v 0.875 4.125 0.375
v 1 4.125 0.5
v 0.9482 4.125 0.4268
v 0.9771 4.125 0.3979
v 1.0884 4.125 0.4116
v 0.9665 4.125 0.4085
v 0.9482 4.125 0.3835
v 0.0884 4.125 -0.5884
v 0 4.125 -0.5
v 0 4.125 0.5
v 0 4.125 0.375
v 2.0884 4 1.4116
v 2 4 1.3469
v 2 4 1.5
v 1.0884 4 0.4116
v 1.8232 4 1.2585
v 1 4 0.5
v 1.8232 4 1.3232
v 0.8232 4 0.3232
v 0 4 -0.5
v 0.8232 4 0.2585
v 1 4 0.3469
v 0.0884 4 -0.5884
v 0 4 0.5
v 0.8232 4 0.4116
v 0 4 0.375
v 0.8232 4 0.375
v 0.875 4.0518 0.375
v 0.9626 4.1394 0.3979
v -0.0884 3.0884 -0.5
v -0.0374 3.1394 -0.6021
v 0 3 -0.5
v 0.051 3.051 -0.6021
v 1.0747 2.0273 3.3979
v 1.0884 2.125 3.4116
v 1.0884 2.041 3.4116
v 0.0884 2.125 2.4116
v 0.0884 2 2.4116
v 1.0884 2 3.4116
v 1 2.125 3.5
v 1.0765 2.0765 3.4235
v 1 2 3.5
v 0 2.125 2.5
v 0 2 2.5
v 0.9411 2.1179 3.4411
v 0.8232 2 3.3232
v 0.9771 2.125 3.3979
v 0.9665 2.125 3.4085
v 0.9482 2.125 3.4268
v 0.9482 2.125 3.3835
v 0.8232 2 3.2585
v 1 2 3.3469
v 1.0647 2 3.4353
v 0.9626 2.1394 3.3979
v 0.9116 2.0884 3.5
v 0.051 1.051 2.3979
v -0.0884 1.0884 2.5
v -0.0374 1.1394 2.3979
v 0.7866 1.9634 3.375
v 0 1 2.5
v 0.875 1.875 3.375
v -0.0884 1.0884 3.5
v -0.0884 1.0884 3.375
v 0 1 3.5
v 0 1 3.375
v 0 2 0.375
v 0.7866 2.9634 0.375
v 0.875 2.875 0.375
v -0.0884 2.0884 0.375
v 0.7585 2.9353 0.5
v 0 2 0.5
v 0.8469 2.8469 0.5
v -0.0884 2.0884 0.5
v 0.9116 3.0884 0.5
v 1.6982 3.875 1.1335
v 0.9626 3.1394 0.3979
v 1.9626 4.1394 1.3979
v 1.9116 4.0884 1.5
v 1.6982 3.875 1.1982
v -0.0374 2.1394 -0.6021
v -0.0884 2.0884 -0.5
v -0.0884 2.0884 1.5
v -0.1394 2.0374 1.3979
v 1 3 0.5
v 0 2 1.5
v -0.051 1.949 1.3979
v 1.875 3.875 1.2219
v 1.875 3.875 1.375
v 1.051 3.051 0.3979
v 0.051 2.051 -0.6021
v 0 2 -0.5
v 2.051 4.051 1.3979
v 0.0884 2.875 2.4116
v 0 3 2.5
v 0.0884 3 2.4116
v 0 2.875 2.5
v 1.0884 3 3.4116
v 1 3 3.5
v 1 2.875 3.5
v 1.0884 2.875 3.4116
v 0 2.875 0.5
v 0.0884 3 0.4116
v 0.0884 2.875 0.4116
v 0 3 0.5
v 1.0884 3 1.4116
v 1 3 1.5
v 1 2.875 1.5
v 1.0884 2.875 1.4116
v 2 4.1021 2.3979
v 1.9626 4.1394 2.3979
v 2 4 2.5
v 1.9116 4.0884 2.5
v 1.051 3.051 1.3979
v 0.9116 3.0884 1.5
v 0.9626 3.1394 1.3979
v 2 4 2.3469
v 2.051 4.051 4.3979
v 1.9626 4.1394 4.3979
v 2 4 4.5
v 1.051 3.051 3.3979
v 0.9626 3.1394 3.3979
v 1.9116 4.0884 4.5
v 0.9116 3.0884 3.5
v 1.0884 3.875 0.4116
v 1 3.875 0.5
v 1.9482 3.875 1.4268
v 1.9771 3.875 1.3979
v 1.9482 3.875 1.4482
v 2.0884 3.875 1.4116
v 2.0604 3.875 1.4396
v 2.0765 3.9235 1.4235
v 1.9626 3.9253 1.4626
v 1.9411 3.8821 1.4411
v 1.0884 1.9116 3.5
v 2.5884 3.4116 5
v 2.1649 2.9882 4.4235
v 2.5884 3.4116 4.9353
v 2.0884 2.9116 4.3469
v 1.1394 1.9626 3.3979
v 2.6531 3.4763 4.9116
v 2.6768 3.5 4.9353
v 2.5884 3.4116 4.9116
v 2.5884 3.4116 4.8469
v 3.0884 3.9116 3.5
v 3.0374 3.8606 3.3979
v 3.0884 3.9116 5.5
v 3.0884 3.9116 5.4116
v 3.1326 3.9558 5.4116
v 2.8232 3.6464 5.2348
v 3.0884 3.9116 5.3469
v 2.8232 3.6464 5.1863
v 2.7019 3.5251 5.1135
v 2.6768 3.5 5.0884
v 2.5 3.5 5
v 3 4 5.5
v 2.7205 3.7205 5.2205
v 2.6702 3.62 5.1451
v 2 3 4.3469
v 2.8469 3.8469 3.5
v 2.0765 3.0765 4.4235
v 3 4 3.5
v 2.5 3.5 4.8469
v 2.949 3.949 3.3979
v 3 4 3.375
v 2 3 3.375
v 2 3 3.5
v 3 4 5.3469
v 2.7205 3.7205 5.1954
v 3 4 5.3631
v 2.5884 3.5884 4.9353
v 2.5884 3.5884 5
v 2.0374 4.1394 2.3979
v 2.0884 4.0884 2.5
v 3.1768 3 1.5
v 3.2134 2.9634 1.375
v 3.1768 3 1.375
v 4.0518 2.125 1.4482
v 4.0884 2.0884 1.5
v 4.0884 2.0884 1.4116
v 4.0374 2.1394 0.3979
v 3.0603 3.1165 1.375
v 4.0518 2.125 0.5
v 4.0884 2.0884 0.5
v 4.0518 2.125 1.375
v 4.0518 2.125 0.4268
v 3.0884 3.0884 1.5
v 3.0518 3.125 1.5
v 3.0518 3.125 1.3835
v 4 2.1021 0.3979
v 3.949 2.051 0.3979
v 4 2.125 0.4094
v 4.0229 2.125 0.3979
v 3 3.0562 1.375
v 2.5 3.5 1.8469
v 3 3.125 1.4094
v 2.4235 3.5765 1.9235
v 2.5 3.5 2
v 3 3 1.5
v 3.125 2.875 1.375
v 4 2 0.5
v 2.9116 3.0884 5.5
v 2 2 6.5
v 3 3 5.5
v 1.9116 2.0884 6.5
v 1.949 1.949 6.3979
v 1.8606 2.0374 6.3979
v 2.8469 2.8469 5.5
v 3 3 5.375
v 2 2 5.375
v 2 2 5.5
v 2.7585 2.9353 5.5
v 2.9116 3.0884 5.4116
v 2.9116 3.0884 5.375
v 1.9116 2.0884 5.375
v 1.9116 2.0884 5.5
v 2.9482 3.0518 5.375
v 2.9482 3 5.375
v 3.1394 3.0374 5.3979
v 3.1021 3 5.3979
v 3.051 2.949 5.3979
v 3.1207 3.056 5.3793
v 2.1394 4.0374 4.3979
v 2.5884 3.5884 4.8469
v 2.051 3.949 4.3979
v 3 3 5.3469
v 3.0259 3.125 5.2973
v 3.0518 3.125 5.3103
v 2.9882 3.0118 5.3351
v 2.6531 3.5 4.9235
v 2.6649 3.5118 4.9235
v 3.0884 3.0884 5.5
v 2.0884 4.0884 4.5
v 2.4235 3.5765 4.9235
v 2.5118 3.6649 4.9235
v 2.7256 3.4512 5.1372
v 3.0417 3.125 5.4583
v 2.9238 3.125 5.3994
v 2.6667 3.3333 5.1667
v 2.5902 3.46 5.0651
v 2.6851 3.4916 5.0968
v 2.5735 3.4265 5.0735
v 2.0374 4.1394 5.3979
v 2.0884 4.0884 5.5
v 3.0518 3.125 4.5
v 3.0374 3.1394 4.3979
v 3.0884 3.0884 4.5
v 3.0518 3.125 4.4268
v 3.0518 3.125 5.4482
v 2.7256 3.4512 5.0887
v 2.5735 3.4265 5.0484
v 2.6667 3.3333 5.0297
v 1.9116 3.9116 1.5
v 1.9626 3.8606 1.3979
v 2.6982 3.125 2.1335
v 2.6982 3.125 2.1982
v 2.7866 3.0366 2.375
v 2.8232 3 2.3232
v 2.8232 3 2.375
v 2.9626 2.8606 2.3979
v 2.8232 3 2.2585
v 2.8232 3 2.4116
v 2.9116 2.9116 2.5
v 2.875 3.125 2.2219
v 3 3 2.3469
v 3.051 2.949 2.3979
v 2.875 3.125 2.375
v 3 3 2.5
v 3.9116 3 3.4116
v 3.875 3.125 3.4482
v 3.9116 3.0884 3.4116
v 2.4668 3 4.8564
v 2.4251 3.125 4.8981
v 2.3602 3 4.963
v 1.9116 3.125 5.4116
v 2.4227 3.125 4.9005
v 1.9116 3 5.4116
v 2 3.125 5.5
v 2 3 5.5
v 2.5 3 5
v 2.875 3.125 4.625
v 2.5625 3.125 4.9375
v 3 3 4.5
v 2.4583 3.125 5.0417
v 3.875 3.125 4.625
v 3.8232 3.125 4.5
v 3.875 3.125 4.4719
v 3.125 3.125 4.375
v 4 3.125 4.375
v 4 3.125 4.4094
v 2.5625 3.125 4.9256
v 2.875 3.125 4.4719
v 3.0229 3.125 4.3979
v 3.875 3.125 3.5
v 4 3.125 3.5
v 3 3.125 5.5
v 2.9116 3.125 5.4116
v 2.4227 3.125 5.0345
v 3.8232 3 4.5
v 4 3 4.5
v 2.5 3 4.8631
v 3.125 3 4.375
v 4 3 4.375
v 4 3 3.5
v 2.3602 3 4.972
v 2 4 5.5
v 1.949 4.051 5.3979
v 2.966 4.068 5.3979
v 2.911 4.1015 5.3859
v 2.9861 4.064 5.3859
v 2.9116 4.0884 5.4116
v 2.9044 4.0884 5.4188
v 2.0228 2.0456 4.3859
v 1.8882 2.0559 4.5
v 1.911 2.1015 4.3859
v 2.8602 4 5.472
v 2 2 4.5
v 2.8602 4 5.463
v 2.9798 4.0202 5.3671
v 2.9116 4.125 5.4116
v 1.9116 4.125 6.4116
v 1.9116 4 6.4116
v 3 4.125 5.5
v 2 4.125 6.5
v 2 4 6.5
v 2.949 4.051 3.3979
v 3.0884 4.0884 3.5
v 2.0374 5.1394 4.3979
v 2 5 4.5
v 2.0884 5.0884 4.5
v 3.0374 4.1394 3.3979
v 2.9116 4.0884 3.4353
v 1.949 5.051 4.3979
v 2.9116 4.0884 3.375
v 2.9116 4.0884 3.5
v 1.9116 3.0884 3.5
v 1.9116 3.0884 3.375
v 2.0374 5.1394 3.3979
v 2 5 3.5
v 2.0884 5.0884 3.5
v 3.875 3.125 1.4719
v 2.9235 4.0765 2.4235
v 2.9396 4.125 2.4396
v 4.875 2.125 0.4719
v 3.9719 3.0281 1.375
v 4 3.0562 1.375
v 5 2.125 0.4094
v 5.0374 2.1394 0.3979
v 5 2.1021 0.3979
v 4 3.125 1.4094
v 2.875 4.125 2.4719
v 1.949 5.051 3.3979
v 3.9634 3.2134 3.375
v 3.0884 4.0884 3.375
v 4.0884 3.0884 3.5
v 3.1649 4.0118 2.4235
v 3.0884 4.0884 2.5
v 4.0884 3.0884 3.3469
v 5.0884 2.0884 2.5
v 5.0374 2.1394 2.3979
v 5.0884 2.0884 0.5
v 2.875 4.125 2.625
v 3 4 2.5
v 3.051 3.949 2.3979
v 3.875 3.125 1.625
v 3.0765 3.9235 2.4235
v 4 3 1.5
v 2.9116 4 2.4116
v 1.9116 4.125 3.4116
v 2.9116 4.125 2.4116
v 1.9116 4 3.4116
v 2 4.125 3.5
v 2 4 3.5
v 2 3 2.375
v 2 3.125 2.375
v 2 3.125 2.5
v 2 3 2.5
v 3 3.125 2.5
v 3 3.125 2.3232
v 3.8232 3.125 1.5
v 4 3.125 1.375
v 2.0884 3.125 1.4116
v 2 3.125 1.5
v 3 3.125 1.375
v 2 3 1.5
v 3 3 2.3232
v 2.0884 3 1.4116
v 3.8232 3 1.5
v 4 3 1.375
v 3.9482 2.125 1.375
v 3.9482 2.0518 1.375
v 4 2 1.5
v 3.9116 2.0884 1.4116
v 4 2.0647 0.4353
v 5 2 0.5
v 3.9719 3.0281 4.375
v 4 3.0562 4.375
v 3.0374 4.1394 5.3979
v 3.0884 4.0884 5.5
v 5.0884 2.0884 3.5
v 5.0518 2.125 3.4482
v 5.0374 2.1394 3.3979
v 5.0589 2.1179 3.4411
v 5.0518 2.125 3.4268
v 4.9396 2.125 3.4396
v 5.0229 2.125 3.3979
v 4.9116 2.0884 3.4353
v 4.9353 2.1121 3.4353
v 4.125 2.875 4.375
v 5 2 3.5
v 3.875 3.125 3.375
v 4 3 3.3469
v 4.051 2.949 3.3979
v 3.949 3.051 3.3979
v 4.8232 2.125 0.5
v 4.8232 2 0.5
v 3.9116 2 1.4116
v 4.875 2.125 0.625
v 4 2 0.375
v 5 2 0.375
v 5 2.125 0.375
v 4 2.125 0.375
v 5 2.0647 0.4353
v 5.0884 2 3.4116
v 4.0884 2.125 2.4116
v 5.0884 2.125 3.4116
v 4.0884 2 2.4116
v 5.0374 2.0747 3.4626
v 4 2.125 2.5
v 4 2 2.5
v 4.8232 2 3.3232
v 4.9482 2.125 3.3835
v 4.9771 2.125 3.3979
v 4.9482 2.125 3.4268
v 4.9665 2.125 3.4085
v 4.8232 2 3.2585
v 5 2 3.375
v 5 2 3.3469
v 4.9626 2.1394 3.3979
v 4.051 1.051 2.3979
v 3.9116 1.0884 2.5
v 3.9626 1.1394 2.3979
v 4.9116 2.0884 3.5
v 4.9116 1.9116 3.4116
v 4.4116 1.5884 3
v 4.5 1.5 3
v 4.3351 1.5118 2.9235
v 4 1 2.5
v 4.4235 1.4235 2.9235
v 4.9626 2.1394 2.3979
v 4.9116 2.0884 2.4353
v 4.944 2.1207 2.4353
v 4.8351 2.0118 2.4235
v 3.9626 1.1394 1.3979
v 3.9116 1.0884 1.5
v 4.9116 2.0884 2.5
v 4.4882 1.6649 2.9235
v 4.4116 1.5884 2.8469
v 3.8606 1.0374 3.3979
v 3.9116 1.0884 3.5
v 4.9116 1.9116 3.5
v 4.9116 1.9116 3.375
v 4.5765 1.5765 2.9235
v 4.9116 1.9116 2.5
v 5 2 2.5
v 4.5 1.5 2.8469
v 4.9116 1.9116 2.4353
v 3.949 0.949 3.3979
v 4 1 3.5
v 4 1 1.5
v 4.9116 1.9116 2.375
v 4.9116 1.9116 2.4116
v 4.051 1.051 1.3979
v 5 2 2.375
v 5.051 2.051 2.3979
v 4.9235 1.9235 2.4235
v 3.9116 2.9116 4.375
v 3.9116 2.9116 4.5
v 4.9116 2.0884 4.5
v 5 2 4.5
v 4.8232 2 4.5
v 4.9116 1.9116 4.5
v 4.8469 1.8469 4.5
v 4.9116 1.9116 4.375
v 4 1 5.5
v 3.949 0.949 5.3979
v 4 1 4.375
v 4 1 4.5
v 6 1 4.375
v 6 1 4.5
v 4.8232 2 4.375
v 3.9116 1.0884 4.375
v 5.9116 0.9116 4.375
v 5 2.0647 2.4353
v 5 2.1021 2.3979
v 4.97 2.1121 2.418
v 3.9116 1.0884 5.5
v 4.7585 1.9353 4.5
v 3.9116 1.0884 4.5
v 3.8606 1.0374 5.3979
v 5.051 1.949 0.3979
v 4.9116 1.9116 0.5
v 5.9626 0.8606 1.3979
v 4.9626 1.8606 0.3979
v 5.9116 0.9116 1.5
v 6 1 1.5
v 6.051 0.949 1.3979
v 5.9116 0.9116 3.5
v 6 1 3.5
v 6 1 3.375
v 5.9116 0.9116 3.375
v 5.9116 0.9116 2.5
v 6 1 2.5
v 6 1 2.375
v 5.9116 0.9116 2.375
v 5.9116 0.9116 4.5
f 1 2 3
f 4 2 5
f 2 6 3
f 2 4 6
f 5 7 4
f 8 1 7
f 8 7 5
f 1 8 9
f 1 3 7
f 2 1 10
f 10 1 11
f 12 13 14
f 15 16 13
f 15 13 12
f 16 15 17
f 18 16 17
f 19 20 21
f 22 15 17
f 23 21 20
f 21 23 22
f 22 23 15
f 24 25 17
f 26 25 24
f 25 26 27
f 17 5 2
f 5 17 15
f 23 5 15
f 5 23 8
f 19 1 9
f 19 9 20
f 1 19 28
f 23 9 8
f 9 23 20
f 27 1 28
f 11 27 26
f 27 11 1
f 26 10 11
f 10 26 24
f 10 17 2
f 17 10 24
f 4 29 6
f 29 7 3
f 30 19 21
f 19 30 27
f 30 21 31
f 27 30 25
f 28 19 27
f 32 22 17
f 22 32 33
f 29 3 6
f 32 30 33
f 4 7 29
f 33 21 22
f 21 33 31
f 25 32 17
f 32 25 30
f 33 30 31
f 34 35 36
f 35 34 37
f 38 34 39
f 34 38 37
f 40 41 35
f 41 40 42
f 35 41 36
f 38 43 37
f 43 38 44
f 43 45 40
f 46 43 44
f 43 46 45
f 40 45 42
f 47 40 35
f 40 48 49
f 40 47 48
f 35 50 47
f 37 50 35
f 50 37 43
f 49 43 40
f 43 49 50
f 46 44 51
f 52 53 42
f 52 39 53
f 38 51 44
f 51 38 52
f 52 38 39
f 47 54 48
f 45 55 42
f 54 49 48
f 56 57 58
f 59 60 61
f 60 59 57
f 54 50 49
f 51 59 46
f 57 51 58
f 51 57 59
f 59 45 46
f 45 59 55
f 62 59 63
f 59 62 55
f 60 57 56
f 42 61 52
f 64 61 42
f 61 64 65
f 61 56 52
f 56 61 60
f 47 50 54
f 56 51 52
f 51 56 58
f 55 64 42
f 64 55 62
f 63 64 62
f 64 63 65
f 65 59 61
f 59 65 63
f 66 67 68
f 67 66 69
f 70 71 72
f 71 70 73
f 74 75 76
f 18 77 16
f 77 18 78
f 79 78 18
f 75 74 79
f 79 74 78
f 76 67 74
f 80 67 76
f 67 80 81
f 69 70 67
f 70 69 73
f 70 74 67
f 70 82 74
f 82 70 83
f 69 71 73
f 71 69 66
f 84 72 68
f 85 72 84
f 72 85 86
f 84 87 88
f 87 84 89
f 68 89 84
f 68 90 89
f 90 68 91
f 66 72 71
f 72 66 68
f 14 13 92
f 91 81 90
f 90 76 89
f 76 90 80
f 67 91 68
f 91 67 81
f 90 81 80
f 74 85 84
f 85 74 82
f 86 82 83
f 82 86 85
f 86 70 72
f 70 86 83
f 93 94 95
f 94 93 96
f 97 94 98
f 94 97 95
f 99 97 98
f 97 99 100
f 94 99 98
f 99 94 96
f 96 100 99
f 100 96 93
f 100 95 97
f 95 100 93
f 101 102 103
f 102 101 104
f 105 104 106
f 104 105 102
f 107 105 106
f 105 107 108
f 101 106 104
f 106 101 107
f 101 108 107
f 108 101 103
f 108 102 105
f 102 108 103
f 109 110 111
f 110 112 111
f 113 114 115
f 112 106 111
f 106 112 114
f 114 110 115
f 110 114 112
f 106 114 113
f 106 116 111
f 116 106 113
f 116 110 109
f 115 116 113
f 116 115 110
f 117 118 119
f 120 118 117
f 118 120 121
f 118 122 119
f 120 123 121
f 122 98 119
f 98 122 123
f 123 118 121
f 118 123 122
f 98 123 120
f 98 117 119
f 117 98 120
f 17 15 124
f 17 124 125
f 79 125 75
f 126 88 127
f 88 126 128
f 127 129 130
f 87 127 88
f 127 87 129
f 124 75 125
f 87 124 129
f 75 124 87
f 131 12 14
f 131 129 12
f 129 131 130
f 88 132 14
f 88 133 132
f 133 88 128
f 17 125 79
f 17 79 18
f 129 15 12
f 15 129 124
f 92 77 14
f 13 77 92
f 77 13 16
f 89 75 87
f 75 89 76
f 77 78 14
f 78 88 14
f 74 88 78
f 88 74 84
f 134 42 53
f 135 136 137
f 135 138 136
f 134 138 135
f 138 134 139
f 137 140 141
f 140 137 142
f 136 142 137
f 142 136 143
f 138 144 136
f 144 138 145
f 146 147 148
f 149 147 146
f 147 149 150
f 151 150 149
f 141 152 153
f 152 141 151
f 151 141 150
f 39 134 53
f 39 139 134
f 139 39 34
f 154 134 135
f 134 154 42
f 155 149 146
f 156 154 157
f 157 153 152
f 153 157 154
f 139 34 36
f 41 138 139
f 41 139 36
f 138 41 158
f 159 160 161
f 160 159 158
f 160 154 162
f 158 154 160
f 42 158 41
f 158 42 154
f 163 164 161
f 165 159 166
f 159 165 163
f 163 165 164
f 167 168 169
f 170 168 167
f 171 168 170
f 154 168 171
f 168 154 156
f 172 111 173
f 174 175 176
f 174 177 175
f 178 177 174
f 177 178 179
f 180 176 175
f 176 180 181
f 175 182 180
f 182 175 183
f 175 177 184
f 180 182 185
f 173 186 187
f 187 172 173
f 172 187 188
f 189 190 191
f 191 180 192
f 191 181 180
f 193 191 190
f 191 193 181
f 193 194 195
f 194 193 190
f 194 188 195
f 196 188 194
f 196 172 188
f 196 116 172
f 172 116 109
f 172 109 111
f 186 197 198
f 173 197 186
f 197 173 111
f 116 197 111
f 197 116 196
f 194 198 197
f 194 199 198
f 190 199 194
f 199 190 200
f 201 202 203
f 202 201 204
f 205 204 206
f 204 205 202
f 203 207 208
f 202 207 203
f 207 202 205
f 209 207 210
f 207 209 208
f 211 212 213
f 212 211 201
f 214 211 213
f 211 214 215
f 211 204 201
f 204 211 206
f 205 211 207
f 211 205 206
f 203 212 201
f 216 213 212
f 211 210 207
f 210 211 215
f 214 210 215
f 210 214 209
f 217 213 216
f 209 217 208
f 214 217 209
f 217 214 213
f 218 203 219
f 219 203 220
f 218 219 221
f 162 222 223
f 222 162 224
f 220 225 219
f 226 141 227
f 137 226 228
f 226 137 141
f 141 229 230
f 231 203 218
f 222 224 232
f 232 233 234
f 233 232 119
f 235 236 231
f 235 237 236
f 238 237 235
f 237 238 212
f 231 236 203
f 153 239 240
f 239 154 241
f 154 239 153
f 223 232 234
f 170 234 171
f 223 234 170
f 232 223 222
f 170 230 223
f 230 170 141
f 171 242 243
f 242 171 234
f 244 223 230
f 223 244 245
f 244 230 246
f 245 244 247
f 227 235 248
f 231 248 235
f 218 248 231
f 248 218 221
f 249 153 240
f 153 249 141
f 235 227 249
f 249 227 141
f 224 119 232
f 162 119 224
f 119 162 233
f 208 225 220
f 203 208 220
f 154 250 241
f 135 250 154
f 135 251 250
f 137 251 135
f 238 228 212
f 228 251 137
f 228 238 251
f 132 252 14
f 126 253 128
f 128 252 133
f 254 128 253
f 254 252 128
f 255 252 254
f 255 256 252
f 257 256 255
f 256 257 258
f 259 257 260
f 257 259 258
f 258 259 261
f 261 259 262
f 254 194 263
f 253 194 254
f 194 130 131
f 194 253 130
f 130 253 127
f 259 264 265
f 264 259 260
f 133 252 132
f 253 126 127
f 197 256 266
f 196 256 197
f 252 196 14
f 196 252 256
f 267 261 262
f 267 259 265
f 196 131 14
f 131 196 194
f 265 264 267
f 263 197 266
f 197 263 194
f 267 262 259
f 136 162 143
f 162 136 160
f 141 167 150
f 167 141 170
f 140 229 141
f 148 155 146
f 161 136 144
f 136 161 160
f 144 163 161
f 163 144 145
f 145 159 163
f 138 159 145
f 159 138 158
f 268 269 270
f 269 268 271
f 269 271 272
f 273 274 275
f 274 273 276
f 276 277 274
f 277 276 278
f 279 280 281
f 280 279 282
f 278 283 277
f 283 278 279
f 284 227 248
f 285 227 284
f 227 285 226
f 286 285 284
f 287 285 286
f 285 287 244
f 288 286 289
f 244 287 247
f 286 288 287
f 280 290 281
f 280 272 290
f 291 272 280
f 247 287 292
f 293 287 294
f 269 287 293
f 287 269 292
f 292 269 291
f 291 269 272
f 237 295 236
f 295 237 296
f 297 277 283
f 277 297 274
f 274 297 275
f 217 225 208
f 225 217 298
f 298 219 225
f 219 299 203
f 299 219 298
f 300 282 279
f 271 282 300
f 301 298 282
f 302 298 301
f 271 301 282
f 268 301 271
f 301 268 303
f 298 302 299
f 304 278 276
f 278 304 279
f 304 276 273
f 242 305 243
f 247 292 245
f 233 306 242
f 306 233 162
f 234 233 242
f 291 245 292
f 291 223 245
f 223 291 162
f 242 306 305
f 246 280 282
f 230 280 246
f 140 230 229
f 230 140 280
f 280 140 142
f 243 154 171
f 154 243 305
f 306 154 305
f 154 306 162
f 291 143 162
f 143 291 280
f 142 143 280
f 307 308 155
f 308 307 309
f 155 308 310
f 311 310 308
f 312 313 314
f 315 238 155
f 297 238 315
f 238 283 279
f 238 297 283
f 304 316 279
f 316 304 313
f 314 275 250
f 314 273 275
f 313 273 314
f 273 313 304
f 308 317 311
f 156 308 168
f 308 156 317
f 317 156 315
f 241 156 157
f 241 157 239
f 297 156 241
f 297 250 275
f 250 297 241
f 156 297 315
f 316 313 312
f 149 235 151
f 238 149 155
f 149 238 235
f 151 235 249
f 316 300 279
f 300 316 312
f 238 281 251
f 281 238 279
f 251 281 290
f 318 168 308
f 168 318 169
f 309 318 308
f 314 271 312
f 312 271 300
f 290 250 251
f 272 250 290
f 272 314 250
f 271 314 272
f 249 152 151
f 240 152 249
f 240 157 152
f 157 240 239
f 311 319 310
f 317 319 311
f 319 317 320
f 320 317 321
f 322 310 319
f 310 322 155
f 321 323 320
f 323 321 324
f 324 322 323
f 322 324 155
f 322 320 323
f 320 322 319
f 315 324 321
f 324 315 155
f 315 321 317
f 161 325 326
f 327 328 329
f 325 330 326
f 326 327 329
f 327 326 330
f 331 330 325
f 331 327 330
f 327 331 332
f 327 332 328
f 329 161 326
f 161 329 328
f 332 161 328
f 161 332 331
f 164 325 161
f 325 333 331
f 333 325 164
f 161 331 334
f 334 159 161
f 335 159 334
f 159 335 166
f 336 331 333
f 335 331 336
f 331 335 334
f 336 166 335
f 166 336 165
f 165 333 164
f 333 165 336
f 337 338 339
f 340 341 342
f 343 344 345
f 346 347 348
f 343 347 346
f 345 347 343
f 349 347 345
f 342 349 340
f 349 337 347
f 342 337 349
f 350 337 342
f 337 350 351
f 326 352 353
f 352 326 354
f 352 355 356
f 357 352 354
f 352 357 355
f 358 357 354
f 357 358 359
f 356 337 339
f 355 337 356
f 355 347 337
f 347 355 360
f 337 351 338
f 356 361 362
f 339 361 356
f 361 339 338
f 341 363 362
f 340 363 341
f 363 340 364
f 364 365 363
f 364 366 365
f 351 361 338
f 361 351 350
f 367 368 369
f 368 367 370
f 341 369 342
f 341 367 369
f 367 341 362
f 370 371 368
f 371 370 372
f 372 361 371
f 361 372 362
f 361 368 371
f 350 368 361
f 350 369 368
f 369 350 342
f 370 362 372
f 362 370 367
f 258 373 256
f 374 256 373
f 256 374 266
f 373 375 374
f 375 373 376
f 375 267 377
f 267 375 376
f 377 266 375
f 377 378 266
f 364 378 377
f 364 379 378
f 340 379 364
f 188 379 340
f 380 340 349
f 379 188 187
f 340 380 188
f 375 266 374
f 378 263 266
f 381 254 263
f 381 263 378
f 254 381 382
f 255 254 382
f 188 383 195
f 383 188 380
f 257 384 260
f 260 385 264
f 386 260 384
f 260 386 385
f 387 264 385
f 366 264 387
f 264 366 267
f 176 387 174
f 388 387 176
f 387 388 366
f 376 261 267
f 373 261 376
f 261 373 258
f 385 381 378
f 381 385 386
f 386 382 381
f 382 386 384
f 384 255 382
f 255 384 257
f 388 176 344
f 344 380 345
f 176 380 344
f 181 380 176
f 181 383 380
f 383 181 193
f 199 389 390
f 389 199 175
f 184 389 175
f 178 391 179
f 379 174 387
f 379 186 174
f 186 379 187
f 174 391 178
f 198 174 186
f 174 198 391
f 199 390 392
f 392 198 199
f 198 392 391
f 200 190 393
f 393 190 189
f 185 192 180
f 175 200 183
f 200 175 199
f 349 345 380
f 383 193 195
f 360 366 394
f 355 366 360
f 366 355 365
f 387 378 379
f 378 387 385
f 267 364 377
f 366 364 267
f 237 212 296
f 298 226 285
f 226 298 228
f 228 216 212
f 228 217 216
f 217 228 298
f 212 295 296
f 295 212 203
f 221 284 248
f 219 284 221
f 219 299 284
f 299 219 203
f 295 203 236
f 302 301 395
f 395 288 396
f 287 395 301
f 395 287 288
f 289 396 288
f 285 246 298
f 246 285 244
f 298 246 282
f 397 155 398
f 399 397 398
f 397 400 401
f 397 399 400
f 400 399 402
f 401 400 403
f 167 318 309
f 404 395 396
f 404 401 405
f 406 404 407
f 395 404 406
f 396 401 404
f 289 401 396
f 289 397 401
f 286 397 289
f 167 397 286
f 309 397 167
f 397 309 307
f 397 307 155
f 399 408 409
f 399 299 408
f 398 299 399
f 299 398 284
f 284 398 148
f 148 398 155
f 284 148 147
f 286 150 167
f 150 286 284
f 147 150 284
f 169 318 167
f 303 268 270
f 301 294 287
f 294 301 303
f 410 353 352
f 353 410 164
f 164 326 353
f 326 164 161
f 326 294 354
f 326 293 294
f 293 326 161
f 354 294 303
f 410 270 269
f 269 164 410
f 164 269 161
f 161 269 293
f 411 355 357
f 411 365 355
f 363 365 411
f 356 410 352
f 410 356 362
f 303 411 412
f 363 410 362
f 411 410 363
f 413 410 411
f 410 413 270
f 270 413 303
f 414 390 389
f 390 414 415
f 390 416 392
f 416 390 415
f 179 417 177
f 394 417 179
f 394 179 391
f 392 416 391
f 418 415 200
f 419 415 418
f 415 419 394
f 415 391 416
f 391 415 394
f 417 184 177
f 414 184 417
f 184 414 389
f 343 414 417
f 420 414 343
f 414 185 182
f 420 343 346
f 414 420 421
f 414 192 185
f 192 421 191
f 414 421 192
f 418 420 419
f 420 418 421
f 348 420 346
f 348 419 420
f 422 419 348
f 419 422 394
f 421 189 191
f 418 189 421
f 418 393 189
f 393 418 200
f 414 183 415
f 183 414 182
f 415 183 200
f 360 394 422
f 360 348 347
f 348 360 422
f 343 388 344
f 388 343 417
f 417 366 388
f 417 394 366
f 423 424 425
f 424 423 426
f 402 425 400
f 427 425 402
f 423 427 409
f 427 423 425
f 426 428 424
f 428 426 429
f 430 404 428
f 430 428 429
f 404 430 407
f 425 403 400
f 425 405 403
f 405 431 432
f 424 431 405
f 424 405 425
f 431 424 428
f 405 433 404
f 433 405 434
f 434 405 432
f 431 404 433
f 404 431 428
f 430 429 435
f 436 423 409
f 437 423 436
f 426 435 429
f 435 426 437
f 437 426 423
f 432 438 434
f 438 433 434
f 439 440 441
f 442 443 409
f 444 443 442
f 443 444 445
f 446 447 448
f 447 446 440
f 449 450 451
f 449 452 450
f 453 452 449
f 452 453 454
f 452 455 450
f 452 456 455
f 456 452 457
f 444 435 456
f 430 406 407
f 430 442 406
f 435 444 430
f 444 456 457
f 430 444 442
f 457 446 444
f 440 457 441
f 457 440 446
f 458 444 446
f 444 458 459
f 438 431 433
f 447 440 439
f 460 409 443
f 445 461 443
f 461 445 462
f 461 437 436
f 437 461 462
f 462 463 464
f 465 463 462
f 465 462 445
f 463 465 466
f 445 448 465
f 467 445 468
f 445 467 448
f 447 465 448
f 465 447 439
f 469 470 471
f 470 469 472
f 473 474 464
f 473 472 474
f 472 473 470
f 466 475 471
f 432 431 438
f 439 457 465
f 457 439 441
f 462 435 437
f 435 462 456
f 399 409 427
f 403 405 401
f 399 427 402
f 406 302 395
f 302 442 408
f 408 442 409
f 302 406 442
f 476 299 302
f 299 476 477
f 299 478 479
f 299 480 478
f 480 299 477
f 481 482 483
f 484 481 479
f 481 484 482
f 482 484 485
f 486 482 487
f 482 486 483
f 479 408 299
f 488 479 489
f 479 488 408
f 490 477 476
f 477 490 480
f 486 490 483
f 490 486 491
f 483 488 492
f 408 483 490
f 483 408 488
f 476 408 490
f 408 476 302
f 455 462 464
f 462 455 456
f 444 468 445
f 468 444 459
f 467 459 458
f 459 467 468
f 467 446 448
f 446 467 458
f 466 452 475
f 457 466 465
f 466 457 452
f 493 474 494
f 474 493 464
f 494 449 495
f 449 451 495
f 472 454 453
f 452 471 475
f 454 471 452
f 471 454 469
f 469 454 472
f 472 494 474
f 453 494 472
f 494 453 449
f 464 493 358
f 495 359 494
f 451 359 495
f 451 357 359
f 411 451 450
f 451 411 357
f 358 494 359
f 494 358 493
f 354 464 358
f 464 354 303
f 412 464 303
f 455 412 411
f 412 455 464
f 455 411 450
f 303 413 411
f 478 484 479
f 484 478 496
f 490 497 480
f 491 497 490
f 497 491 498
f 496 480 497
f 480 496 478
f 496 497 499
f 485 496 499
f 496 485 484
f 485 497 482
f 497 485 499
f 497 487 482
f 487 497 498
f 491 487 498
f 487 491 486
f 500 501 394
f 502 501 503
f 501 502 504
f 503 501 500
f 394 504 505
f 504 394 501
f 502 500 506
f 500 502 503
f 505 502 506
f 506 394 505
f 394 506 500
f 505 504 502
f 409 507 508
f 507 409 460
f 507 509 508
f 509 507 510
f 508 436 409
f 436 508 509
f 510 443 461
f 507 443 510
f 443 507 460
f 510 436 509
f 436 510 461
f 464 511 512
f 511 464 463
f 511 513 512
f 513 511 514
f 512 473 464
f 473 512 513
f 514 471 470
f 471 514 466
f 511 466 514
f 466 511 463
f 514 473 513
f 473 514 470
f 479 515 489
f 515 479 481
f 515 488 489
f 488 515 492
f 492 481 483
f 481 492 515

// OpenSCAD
translate(v = [-0.5, -0.5, 0]) {
	/*Shell 0*/
	union() {
		%/*Nodes shell 0*/
		union() {
			/*Node $_12*/
			color(alpha = 0.1, c = "orange") {
				translate(v = [0, 4, -1]) {
					cube(size = [1, 1, 1]);
				}
			}
			/*Node $_25*/
			color(alpha = 0.1, c = "yellow") {
				translate(v = [0, 4, 0]) {
					cube(size = [1, 1, 1]);
				}
			}
			/*Node $_6*/
			color(alpha = 0.1, c = "pink") {
				translate(v = [0, 3, -1]) {
					cube(size = [1, 1, 1]);
				}
			}
			/*Node $_14*/
			color(alpha = 0.1, c = "orange") {
				translate(v = [0, 2, 2]) {
					cube(size = [1, 1, 1]);
				}
			}
			/*Node $_27*/
			color(alpha = 0.1, c = "yellow") {
				translate(v = [0, 1, 2]) {
					cube(size = [1, 1, 1]);
				}
			}
			/*Node $_8*/
			color(alpha = 0.1, c = "pink") {
				translate(v = [0, 1, 3]) {
					cube(size = [1, 1, 1]);
				}
			}
			/*Node $_21*/
			color(alpha = 0.1, c = "orange") {
				translate(v = [0, 2, 0]) {
					cube(size = [1, 1, 1]);
				}
			}
			/*Node $_34*/
			color(alpha = 0.1, c = "yellow") {
				translate(v = [0, 2, -1]) {
					cube(size = [1, 1, 1]);
				}
			}
			/*Node $_10*/
			color(alpha = 0.1, c = "pink") {
				translate(v = [0, 2, 1]) {
					cube(size = [1, 1, 1]);
				}
			}
			/*Node $_5__0*/
			color(alpha = 0.1, c = "lightblue") {
				translate(v = [0, 3, 2]) {
					cube(size = [1, 1, 1]);
				}
			}
			/*Node $_3__0*/
			color(alpha = 0.1, c = "lightblue") {
				translate(v = [0, 3, 0]) {
					cube(size = [1, 1, 1]);
				}
			}
		}
		/*Edges shell 0*/
		union() {
			/*Edge 12 from bank.devices[0].thingy.vcollect to $_12*/
			translate(v = [0.5, 4.5, -0.5]) {
				rotate(a = [0, 45.00000000000001, 0.0]) {
					cube(size = [0.125, 0.125, 1.4142135623730951]);
				}
			}
			/*Edge 25 from bank.devices[0].thingy.vcollect to $_25*/
			translate(v = [0.5, 4.5, 0.5]) {
				rotate(a = [0, 90.0, 0.0]) {
					cube(size = [0.125, 0.125, 1.0]);
				}
			}
			/*Edge 6 from bank.devices[0].thingy.vcollect to $_6*/
			translate(v = [0.5, 3.5, -0.5]) {
				rotate(a = [0, 54.735610317245346, 45.0]) {
					cube(size = [0.125, 0.125, 1.7320508075688772]);
				}
			}
			/*Edge 14 from bank.devices[0].thingy.vlysis_out to $_14*/
			translate(v = [0.5, 2.5, 2.5]) {
				rotate(a = [0, 45.00000000000001, 0.0]) {
					cube(size = [0.125, 0.125, 1.4142135623730951]);
				}
			}
			/*Edge 27 from bank.devices[0].thingy.vlysis_out to $_27*/
			translate(v = [0.5, 1.5, 2.5]) {
				rotate(a = [0, 54.735610317245346, 45.0]) {
					cube(size = [0.125, 0.125, 1.7320508075688772]);
				}
			}
			/*Edge 8 from bank.devices[0].thingy.vlysis_out to $_8*/
			translate(v = [0.5, 1.5, 3.5]) {
				rotate(a = [0, 90.0, 45.0]) {
					cube(size = [0.125, 0.125, 1.4142135623730951]);
				}
			}
			/*Edge 21 from bank.devices[0].thingy.vwaste to $_21*/
			translate(v = [0.5, 2.5, 0.5]) {
				rotate(a = [0, 90.0, 45.0]) {
					cube(size = [0.125, 0.125, 1.4142135623730951]);
				}
			}
			/*Edge 34 from bank.devices[0].thingy.vwaste to $_34*/
			translate(v = [0.5, 2.5, -0.5]) {
				rotate(a = [0, 54.735610317245346, 45.0]) {
					cube(size = [0.125, 0.125, 1.7320508075688772]);
				}
			}
			/*Edge 10 from bank.devices[0].thingy.vwaste to $_10*/
			translate(v = [0.5, 2.5, 1.5]) {
				rotate(a = [0, 125.26438968275465, 45.0]) {
					cube(size = [0.125, 0.125, 1.7320508075688772]);
				}
			}
			/*Edge -1 from $_5__0 to $_5__1*/
			translate(v = [1.5, 3.5, 3.5]) {
				rotate(a = [0, 135.0, 180.0]) {
					cube(size = [0.125, 0.125, 1.4142135623730951]);
				}
			}
			/*Edge -1 from $_3__0 to $_3__1*/
			translate(v = [1.5, 3.5, 1.5]) {
				rotate(a = [0, 135.0, 180.0]) {
					cube(size = [0.125, 0.125, 1.4142135623730951]);
				}
			}
		}
	}
	/*Shell 1*/
	union() {
		%/*Nodes shell 1*/
		union() {
			/*Node bank.devices[0].thingy.vcollect*/
			color(alpha = 0.1, c = "black") {
				translate(v = [1, 4, 0]) {
					cube(size = [1, 1, 1]);
				}
			}
			/*Node bank.devices[0].thingy.vlysis_out*/
			color(alpha = 0.1, c = "black") {
				translate(v = [1, 2, 3]) {
					cube(size = [1, 1, 1]);
				}
			}
			/*Node bank.devices[0].thingy.vwaste*/
			color(alpha = 0.1, c = "black") {
				translate(v = [1, 3, 0]) {
					cube(size = [1, 1, 1]);
				}
			}
			/*Node $_5__1*/
			color(alpha = 0.1, c = "lightblue") {
				translate(v = [1, 3, 3]) {
					cube(size = [1, 1, 1]);
				}
			}
			/*Node $_3__1*/
			color(alpha = 0.1, c = "lightblue") {
				translate(v = [1, 3, 1]) {
					cube(size = [1, 1, 1]);
				}
			}
		}
		/*Edges shell 1*/
		union() {
			/*Edge -1 from $_3 to $_3__1*/
			translate(v = [1.5, 3.5, 1.5]) {
				rotate(a = [0, 54.735610317245346, 45.0]) {
					cube(size = [0.125, 0.125, 1.7320508075688772]);
				}
			}
			/*Edge -1 from $_5 to $_5__1*/
			translate(v = [1.5, 3.5, 3.5]) {
				rotate(a = [0, 54.735610317245346, 45.0]) {
					cube(size = [0.125, 0.125, 1.7320508075688772]);
				}
			}
			/*Edge 40 from bank.devices[0].thingy.vcollect to $_40*/
			translate(v = [2.5, 4.5, 1.5]) {
				rotate(a = [0, 135.0, 180.0]) {
					cube(size = [0.125, 0.125, 1.4142135623730951]);
				}
			}
			/*Edge 40 from $_40 to bank.devices[0].thingy.vwaste*/
			translate(v = [1.5, 3.5, 0.5]) {
				rotate(a = [0, 54.735610317245346, 45.0]) {
					cube(size = [0.125, 0.125, 1.7320508075688772]);
				}
			}
			/*Edge 42 from bank.devices[0].thingy.vlysis_out to $_42*/
			translate(v = [2.5, 3.5, 4.5]) {
				rotate(a = [0, 125.26438968275465, -135.0]) {
					cube(size = [0.125, 0.125, 1.7320508075688772]);
				}
			}
		}
	}
	/*Shell 2*/
	union() {
		%/*Nodes shell 2*/
		union() {
			/*Node $_3*/
			color(alpha = 0.1, c = "pink") {
				translate(v = [2, 4, 2]) {
					cube(size = [1, 1, 1]);
				}
			}
			/*Node $_24*/
			color(alpha = 0.1, c = "yellow") {
				translate(v = [2, 2, 6]) {
					cube(size = [1, 1, 1]);
				}
			}
			/*Node $_39*/
			color(alpha = 0.1, c = "yellow") {
				translate(v = [2, 2, 5]) {
					cube(size = [1, 1, 1]);
				}
			}
			/*Node $_5*/
			color(alpha = 0.1, c = "pink") {
				translate(v = [2, 4, 4]) {
					cube(size = [1, 1, 1]);
				}
			}
			/*Node $_40*/
			color(alpha = 0.1, c = "lightgreen") {
				translate(v = [2, 4, 1]) {
					cube(size = [1, 1, 1]);
				}
			}
			/*Node $_42*/
			color(alpha = 0.1, c = "lightgreen") {
				translate(v = [2, 3, 4]) {
					cube(size = [1, 1, 1]);
				}
			}
			/*Node $_16*/
			color(alpha = 0.1, c = "orange") {
				translate(v = [2, 3, 5]) {
					cube(size = [1, 1, 1]);
				}
			}
			/*Node $_29*/
			color(alpha = 0.1, c = "yellow") {
				translate(v = [2, 4, 5]) {
					cube(size = [1, 1, 1]);
				}
			}
			/*Node $_17*/
			color(alpha = 0.1, c = "orange") {
				translate(v = [2, 2, 4]) {
					cube(size = [1, 1, 1]);
				}
			}
			/*Node $_30*/
			color(alpha = 0.1, c = "yellow") {
				translate(v = [2, 4, 6]) {
					cube(size = [1, 1, 1]);
				}
			}
			/*Node $_18*/
			color(alpha = 0.1, c = "orange") {
				translate(v = [2, 5, 4]) {
					cube(size = [1, 1, 1]);
				}
			}
			/*Node $_31*/
			color(alpha = 0.1, c = "yellow") {
				translate(v = [2, 3, 3]) {
					cube(size = [1, 1, 1]);
				}
			}
			/*Node $_19*/
			color(alpha = 0.1, c = "orange") {
				translate(v = [2, 5, 3]) {
					cube(size = [1, 1, 1]);
				}
			}
			/*Node $_32*/
			color(alpha = 0.1, c = "yellow") {
				translate(v = [2, 4, 3]) {
					cube(size = [1, 1, 1]);
				}
			}
			/*Node $_20*/
			color(alpha = 0.1, c = "orange") {
				translate(v = [2, 3, 2]) {
					cube(size = [1, 1, 1]);
				}
			}
			/*Node $_33*/
			color(alpha = 0.1, c = "yellow") {
				translate(v = [2, 3, 1]) {
					cube(size = [1, 1, 1]);
				}
			}
		}
		/*Edges shell 2*/
		union() {
			/*Edge 3 from bank.devices[0].thingy.vbead_out to $_3*/
			translate(v = [2.5, 4.5, 2.5]) {
				rotate(a = [0, 125.26438968275465, -45.0]) {
					cube(size = [0.125, 0.125, 1.7320508075688772]);
				}
			}
			/*Edge 24 from bank.devices[0].thingy.vcell_out to $_24*/
			translate(v = [2.5, 2.5, 6.5]) {
				rotate(a = [0, 125.26438968275465, 45.0]) {
					cube(size = [0.125, 0.125, 1.7320508075688772]);
				}
			}
			/*Edge 39 from bank.devices[0].thingy.vcell_out to $_39*/
			translate(v = [2.5, 2.5, 5.5]) {
				rotate(a = [0, 90.0, 45.0]) {
					cube(size = [0.125, 0.125, 1.4142135623730951]);
				}
			}
			/*Edge 5 from bank.devices[0].thingy.vcell_out to $_5*/
			translate(v = [2.5, 4.5, 4.5]) {
				rotate(a = [0, 54.735610317245346, -45.0]) {
					cube(size = [0.125, 0.125, 1.7320508075688772]);
				}
			}
			/*Edge 40 from $_40 to bank.devices[0].thingy.vsieve*/
			translate(v = [3.5, 3.5, 2.5]) {
				rotate(a = [0, 125.26438968275465, 135.0]) {
					cube(size = [0.125, 0.125, 1.7320508075688772]);
				}
			}
			/*Edge 42 from $_42 to bank.devices[0].thingy.vpump2*/
			translate(v = [3.5, 4.5, 5.5]) {
				rotate(a = [0, 125.26438968275465, -135.0]) {
					cube(size = [0.125, 0.125, 1.7320508075688772]);
				}
			}
			/*Edge 42 from $_42 to bank.devices[0].thingy.vpump3*/
			translate(v = [3.5, 4.5, 3.5]) {
				rotate(a = [0, 54.735610317245346, -135.0]) {
					cube(size = [0.125, 0.125, 1.7320508075688772]);
				}
			}
			/*Edge 16 from bank.devices[0].thingy.vpump1 to $_16*/
			translate(v = [2.5, 3.5, 5.5]) {
				rotate(a = [0, 135.0, 0.0]) {
					cube(size = [0.125, 0.125, 1.4142135623730951]);
				}
			}
			/*Edge 29 from bank.devices[0].thingy.vpump1 to $_29*/
			translate(v = [2.5, 4.5, 5.5]) {
				rotate(a = [0, 125.26438968275465, -45.0]) {
					cube(size = [0.125, 0.125, 1.7320508075688772]);
				}
			}
			/*Edge 17 from bank.devices[0].thingy.vpump2 to $_17*/
			translate(v = [2.5, 2.5, 4.5]) {
				rotate(a = [0, 65.9051574478893, 63.43494882292201]) {
					cube(size = [0.125, 0.125, 2.449489742783178]);
				}
			}
			/*Edge 30 from bank.devices[0].thingy.vpump2 to $_30*/
			translate(v = [2.5, 4.5, 6.5]) {
				rotate(a = [0, 135.0, 0.0]) {
					cube(size = [0.125, 0.125, 1.4142135623730951]);
				}
			}
			/*Edge 18 from bank.devices[0].thingy.vpump3 to $_18*/
			translate(v = [2.5, 5.5, 4.5]) {
				rotate(a = [0, 125.26438968275465, -45.0]) {
					cube(size = [0.125, 0.125, 1.7320508075688772]);
				}
			}
			/*Edge 31 from bank.devices[0].thingy.vpump3 to $_31*/
			translate(v = [2.5, 3.5, 3.5]) {
				rotate(a = [0, 90.0, 45.0]) {
					cube(size = [0.125, 0.125, 1.4142135623730951]);
				}
			}
			/*Edge 19 from bank.devices[0].thingy.vsep to $_19*/
			translate(v = [2.5, 5.5, 3.5]) {
				rotate(a = [0, 125.26438968275465, -45.0]) {
					cube(size = [0.125, 0.125, 1.7320508075688772]);
				}
			}
			/*Edge 32 from bank.devices[0].thingy.vsep to $_32*/
			translate(v = [2.5, 4.5, 3.5]) {
				rotate(a = [0, 135.0, 0.0]) {
					cube(size = [0.125, 0.125, 1.4142135623730951]);
				}
			}
			/*Edge 20 from bank.devices[0].thingy.vsieve to $_20*/
			translate(v = [2.5, 3.5, 2.5]) {
				rotate(a = [0, 90.0, 0.0]) {
					cube(size = [0.125, 0.125, 1.0]);
				}
			}
			/*Edge 33 from bank.devices[0].thingy.vsieve to $_33*/
			translate(v = [2.5, 3.5, 1.5]) {
				rotate(a = [0, 45.00000000000001, 0.0]) {
					cube(size = [0.125, 0.125, 1.4142135623730951]);
				}
			}
		}
	}
	/*Shell 3*/
	union() {
		%/*Nodes shell 3*/
		union() {
			/*Node bank.devices[0].thingy.vbead_out*/
			color(alpha = 0.1, c = "black") {
				translate(v = [3, 3, 1]) {
					cube(size = [1, 1, 1]);
				}
			}
			/*Node bank.devices[0].thingy.vcell_out*/
			color(alpha = 0.1, c = "black") {
				translate(v = [3, 3, 5]) {
					cube(size = [1, 1, 1]);
				}
			}
			/*Node bank.devices[0].thingy.vpump1*/
			color(alpha = 0.1, c = "black") {
				translate(v = [3, 3, 4]) {
					cube(size = [1, 1, 1]);
				}
			}
			/*Node bank.devices[0].thingy.vpump2*/
			color(alpha = 0.1, c = "black") {
				translate(v = [3, 4, 5]) {
					cube(size = [1, 1, 1]);
				}
			}
			/*Node bank.devices[0].thingy.vpump3*/
			color(alpha = 0.1, c = "black") {
				translate(v = [3, 4, 3]) {
					cube(size = [1, 1, 1]);
				}
			}
			/*Node bank.devices[0].thingy.vsep*/
			color(alpha = 0.1, c = "black") {
				translate(v = [3, 4, 2]) {
					cube(size = [1, 1, 1]);
				}
			}
			/*Node bank.devices[0].thingy.vsieve*/
			color(alpha = 0.1, c = "black") {
				translate(v = [3, 3, 2]) {
					cube(size = [1, 1, 1]);
				}
			}
		}
		/*Edges shell 3*/
		union() {
			/*Edge 22 from $_22 to bank.devices[0].thingy.vbead_out*/
			translate(v = [3.5, 3.5, 1.5]) {
				rotate(a = [0, 90.0, -45.0]) {
					cube(size = [0.125, 0.125, 1.4142135623730951]);
				}
			}
			/*Edge 35 from $_35 to bank.devices[0].thingy.vbead_out*/
			translate(v = [3.5, 3.5, 1.5]) {
				rotate(a = [0, 125.26438968275465, -45.0]) {
					cube(size = [0.125, 0.125, 1.7320508075688772]);
				}
			}
			/*Edge 37 from $_37 to bank.devices[0].thingy.vbead_out*/
			translate(v = [3.5, 3.5, 1.5]) {
				rotate(a = [0, 90.0, 0.0]) {
					cube(size = [0.125, 0.125, 1.0]);
				}
			}
			/*Edge 37 from $_37 to bank.devices[0].thingy.vsep*/
			translate(v = [3.5, 4.5, 2.5]) {
				rotate(a = [0, 125.26438968275465, -45.0]) {
					cube(size = [0.125, 0.125, 1.7320508075688772]);
				}
			}
			/*Edge 37 from $_37 to bank.devices[0].thingy.vsieve*/
			translate(v = [3.5, 3.5, 2.5]) {
				rotate(a = [0, 135.0, 0.0]) {
					cube(size = [0.125, 0.125, 1.4142135623730951]);
				}
			}
			/*Edge 38 from $_38 to bank.devices[0].thingy.vcell_out*/
			translate(v = [3.5, 3.5, 5.5]) {
				rotate(a = [0, 135.0, 0.0]) {
					cube(size = [0.125, 0.125, 1.4142135623730951]);
				}
			}
			/*Edge 38 from $_38 to bank.devices[0].thingy.vpump1*/
			translate(v = [3.5, 3.5, 4.5]) {
				rotate(a = [0, 90.0, 0.0]) {
					cube(size = [0.125, 0.125, 1.0]);
				}
			}
			/*Edge 38 from $_38 to bank.devices[0].thingy.vpump2*/
			translate(v = [3.5, 4.5, 5.5]) {
				rotate(a = [0, 125.26438968275465, -45.0]) {
					cube(size = [0.125, 0.125, 1.7320508075688772]);
				}
			}
			/*Edge 41 from $_41 to bank.devices[0].thingy.vpump1*/
			translate(v = [3.5, 3.5, 4.5]) {
				rotate(a = [0, 135.0, 0.0]) {
					cube(size = [0.125, 0.125, 1.4142135623730951]);
				}
			}
			/*Edge 41 from $_41 to bank.devices[0].thingy.vpump3*/
			translate(v = [3.5, 4.5, 3.5]) {
				rotate(a = [0, 90.0, -45.0]) {
					cube(size = [0.125, 0.125, 1.4142135623730951]);
				}
			}
			/*Edge 41 from $_41 to bank.devices[0].thingy.vsep*/
			translate(v = [3.5, 4.5, 2.5]) {
				rotate(a = [0, 54.735610317245346, -45.0]) {
					cube(size = [0.125, 0.125, 1.7320508075688772]);
				}
			}
		}
	}
	/*Shell 4*/
	union() {
		%/*Nodes shell 4*/
		union() {
			/*Node $_22*/
			color(alpha = 0.1, c = "orange") {
				translate(v = [4, 2, 1]) {
					cube(size = [1, 1, 1]);
				}
			}
			/*Node $_35*/
			color(alpha = 0.1, c = "yellow") {
				translate(v = [4, 2, 0]) {
					cube(size = [1, 1, 1]);
				}
			}
			/*Node $_37*/
			color(alpha = 0.1, c = "lightgreen") {
				translate(v = [4, 3, 1]) {
					cube(size = [1, 1, 1]);
				}
			}
			/*Node $_23*/
			color(alpha = 0.1, c = "orange") {
				translate(v = [4, 2, 2]) {
					cube(size = [1, 1, 1]);
				}
			}
			/*Node $_36*/
			color(alpha = 0.1, c = "yellow") {
				translate(v = [4, 1, 2]) {
					cube(size = [1, 1, 1]);
				}
			}
			/*Node $_38*/
			color(alpha = 0.1, c = "lightgreen") {
				translate(v = [4, 3, 4]) {
					cube(size = [1, 1, 1]);
				}
			}
			/*Node $_13*/
			color(alpha = 0.1, c = "orange") {
				translate(v = [4, 1, 3]) {
					cube(size = [1, 1, 1]);
				}
			}
			/*Node $_26*/
			color(alpha = 0.1, c = "yellow") {
				translate(v = [4, 1, 1]) {
					cube(size = [1, 1, 1]);
				}
			}
			/*Node $_41*/
			color(alpha = 0.1, c = "lightgreen") {
				translate(v = [4, 3, 3]) {
					cube(size = [1, 1, 1]);
				}
			}
			/*Node $_15*/
			color(alpha = 0.1, c = "orange") {
				translate(v = [4, 1, 5]) {
					cube(size = [1, 1, 1]);
				}
			}
			/*Node $_28*/
			color(alpha = 0.1, c = "yellow") {
				translate(v = [4, 1, 4]) {
					cube(size = [1, 1, 1]);
				}
			}
		}
		/*Edges shell 4*/
		union() {
			/*Edge 22 from bank.devices[0].thingy.vbead_in to $_22*/
			translate(v = [4.5, 2.5, 1.5]) {
				rotate(a = [0, 135.0, 0.0]) {
					cube(size = [0.125, 0.125, 1.4142135623730951]);
				}
			}
			/*Edge 35 from bank.devices[0].thingy.vbead_in to $_35*/
			translate(v = [4.5, 2.5, 0.5]) {
				rotate(a = [0, 90.0, 0.0]) {
					cube(size = [0.125, 0.125, 1.0]);
				}
			}
			/*Edge 37 from bank.devices[0].thingy.vbead_in to $_37*/
			translate(v = [4.5, 3.5, 1.5]) {
				rotate(a = [0, 125.26438968275465, -45.0]) {
					cube(size = [0.125, 0.125, 1.7320508075688772]);
				}
			}
			/*Edge 23 from bank.devices[0].thingy.vcell_in to $_23*/
			translate(v = [4.5, 2.5, 2.5]) {
				rotate(a = [0, 45.00000000000001, 0.0]) {
					cube(size = [0.125, 0.125, 1.4142135623730951]);
				}
			}
			/*Edge 36 from bank.devices[0].thingy.vcell_in to $_36*/
			translate(v = [4.5, 1.5, 2.5]) {
				rotate(a = [0, 54.735610317245346, 45.0]) {
					cube(size = [0.125, 0.125, 1.7320508075688772]);
				}
			}
			/*Edge 38 from bank.devices[0].thingy.vcell_in to $_38*/
			translate(v = [4.5, 3.5, 4.5]) {
				rotate(a = [0, 125.26438968275465, -45.0]) {
					cube(size = [0.125, 0.125, 1.7320508075688772]);
				}
			}
			/*Edge 38 from $_38 to bank.devices[0].thingy.vpush*/
			translate(v = [5.5, 2.5, 4.5]) {
				rotate(a = [0, 90.0, 135.0]) {
					cube(size = [0.125, 0.125, 1.4142135623730951]);
				}
			}
			/*Edge 13 from bank.devices[0].thingy.vlysis_in to $_13*/
			translate(v = [4.5, 1.5, 3.5]) {
				rotate(a = [0, 125.26438968275465, 45.0]) {
					cube(size = [0.125, 0.125, 1.7320508075688772]);
				}
			}
			/*Edge 26 from bank.devices[0].thingy.vlysis_in to $_26*/
			translate(v = [4.5, 1.5, 1.5]) {
				rotate(a = [0, 54.735610317245346, 45.0]) {
					cube(size = [0.125, 0.125, 1.7320508075688772]);
				}
			}
			/*Edge 41 from bank.devices[0].thingy.vlysis_in to $_41*/
			translate(v = [4.5, 3.5, 3.5]) {
				rotate(a = [0, 125.26438968275465, -45.0]) {
					cube(size = [0.125, 0.125, 1.7320508075688772]);
				}
			}
			/*Edge 15 from bank.devices[0].thingy.vpush to $_15*/
			translate(v = [4.5, 1.5, 5.5]) {
				rotate(a = [0, 125.26438968275465, 45.0]) {
					cube(size = [0.125, 0.125, 1.7320508075688772]);
				}
			}
			/*Edge 28 from bank.devices[0].thingy.vpush to $_28*/
			translate(v = [4.5, 1.5, 4.5]) {
				rotate(a = [0, 90.0, 45.0]) {
					cube(size = [0.125, 0.125, 1.4142135623730951]);
				}
			}
		}
	}
	/*Shell 5*/
	union() {
		%/*Nodes shell 5*/
		union() {
			/*Node bank.devices[0].thingy.vbead_in*/
			color(alpha = 0.1, c = "black") {
				translate(v = [5, 2, 0]) {
					cube(size = [1, 1, 1]);
				}
			}
			/*Node bank.devices[0].thingy.vcell_in*/
			color(alpha = 0.1, c = "black") {
				translate(v = [5, 2, 3]) {
					cube(size = [1, 1, 1]);
				}
			}
			/*Node bank.devices[0].thingy.vlysis_in*/
			color(alpha = 0.1, c = "black") {
				translate(v = [5, 2, 2]) {
					cube(size = [1, 1, 1]);
				}
			}
			/*Node bank.devices[0].thingy.vpush*/
			color(alpha = 0.1, c = "black") {
				translate(v = [5, 2, 4]) {
					cube(size = [1, 1, 1]);
				}
			}
		}
		/*Edges shell 5*/
		union() {
			/*Edge 2 from bank.devices[0].thingy.vbead_in to $_2*/
			translate(v = [6.5, 1.5, 1.5]) {
				rotate(a = [0, 125.26438968275465, 135.0]) {
					cube(size = [0.125, 0.125, 1.7320508075688772]);
				}
			}
			/*Edge 4 from bank.devices[0].thingy.vcell_in to $_4*/
			translate(v = [6.5, 1.5, 3.5]) {
				rotate(a = [0, 90.0, 135.0]) {
					cube(size = [0.125, 0.125, 1.4142135623730951]);
				}
			}
			/*Edge 7 from bank.devices[0].thingy.vlysis_in to $_7*/
			translate(v = [6.5, 1.5, 2.5]) {
				rotate(a = [0, 90.0, 135.0]) {
					cube(size = [0.125, 0.125, 1.4142135623730951]);
				}
			}
			/*Edge 9 from bank.devices[0].thingy.vpush to $_9*/
			translate(v = [6.5, 1.5, 4.5]) {
				rotate(a = [0, 90.0, 135.0]) {
					cube(size = [0.125, 0.125, 1.4142135623730951]);
				}
			}
		}
	}
	/*Shell 6*/
	union() {
		%/*Nodes shell 6*/
		union() {
			/*Node $_2*/
			color(alpha = 0.1, c = "pink") {
				translate(v = [6, 1, 1]) {
					cube(size = [1, 1, 1]);
				}
			}
			/*Node $_4*/
			color(alpha = 0.1, c = "pink") {
				translate(v = [6, 1, 3]) {
					cube(size = [1, 1, 1]);
				}
			}
			/*Node $_7*/
			color(alpha = 0.1, c = "pink") {
				translate(v = [6, 1, 2]) {
					cube(size = [1, 1, 1]);
				}
			}
			/*Node $_9*/
			color(alpha = 0.1, c = "pink") {
				translate(v = [6, 1, 4]) {
					cube(size = [1, 1, 1]);
				}
			}
		}
		/*Edges shell 6*/
		union();
	}
}
